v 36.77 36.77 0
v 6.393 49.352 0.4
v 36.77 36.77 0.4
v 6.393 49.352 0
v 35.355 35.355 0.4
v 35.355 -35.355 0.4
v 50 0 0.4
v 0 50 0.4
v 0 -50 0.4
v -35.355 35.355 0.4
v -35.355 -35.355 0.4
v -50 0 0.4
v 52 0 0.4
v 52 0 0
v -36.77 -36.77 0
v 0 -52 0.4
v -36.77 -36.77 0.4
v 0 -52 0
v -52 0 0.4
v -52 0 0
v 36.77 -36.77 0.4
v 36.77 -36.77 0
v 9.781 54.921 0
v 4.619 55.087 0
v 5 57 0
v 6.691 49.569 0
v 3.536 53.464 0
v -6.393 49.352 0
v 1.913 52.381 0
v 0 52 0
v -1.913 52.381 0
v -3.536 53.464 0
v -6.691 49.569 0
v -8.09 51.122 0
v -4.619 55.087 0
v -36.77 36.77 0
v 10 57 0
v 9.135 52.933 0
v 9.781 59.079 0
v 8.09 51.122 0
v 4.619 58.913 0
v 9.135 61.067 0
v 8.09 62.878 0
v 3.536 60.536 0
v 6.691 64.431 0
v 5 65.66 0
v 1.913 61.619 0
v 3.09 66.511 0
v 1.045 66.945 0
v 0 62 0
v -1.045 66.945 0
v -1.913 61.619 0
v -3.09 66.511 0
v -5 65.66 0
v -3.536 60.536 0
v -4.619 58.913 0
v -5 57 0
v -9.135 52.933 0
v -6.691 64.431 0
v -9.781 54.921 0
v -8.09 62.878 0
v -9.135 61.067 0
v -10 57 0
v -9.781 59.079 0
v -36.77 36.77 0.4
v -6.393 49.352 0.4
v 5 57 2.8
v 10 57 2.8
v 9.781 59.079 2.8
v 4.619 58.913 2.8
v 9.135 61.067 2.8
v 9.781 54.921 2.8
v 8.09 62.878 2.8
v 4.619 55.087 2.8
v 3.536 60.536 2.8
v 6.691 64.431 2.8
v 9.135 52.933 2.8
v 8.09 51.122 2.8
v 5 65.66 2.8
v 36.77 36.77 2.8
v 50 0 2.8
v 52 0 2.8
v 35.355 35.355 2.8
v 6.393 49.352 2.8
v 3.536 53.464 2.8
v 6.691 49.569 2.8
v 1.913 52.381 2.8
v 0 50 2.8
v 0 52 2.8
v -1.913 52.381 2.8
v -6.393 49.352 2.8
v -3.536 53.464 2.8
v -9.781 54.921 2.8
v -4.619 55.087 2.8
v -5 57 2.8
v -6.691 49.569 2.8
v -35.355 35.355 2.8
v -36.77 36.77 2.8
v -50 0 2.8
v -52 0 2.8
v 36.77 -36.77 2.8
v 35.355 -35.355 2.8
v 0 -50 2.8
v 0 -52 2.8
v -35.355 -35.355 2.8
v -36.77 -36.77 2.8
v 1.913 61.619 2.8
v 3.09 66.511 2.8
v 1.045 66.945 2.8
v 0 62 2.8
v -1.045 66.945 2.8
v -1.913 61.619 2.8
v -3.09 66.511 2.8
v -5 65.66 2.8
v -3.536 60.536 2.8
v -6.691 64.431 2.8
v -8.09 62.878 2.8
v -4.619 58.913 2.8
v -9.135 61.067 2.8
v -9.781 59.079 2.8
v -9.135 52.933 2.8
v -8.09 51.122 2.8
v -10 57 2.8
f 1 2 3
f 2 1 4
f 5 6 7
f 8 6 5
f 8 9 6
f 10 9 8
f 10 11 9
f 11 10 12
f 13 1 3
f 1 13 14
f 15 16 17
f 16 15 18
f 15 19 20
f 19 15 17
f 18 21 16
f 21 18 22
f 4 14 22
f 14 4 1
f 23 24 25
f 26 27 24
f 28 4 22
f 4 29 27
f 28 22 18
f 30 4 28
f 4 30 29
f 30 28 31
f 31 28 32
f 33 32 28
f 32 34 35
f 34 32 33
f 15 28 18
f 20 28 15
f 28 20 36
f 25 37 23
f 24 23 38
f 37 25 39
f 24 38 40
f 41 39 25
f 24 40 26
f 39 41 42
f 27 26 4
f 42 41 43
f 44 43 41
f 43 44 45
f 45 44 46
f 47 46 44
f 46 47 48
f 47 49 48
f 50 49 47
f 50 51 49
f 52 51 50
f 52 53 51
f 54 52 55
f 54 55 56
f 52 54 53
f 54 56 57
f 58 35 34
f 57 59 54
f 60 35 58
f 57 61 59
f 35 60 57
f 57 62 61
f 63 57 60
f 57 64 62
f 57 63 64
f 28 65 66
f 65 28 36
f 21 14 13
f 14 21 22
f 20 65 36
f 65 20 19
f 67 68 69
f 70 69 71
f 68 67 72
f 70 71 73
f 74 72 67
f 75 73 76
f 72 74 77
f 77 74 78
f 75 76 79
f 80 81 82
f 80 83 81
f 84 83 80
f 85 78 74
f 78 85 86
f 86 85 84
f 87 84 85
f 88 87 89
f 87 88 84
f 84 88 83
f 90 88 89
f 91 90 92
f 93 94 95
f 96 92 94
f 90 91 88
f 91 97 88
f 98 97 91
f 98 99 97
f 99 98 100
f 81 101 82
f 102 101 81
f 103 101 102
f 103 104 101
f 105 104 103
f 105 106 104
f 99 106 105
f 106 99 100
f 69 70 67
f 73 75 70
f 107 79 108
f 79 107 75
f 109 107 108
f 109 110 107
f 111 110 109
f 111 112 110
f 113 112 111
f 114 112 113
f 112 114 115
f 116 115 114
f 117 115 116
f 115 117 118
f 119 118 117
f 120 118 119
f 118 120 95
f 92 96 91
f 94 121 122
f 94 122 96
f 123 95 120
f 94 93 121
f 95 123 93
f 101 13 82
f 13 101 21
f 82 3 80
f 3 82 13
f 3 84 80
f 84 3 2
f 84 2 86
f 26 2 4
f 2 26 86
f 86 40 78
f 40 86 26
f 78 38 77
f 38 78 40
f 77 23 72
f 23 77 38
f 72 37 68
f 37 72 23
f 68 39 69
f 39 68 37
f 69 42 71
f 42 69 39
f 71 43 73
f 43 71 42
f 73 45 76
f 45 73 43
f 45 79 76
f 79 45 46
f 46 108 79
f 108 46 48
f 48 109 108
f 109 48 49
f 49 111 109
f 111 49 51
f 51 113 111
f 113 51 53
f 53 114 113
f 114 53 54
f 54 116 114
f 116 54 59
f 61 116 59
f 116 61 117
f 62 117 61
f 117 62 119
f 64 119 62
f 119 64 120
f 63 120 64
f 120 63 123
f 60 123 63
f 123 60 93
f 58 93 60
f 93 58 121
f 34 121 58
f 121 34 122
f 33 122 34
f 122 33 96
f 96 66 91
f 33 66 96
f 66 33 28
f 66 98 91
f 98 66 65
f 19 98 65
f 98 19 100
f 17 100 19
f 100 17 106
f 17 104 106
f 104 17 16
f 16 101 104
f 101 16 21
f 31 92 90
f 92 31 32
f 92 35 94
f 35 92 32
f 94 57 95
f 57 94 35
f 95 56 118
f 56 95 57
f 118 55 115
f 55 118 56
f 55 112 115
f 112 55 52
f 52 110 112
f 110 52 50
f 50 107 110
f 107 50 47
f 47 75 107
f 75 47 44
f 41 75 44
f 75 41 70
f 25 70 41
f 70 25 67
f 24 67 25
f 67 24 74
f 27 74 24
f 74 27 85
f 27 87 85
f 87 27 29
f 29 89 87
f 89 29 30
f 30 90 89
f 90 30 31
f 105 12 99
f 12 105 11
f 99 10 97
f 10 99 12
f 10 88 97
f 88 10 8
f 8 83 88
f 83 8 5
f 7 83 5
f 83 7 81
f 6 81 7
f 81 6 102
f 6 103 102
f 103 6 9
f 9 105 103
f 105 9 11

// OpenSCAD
// [FL_INDEX: keywords="openscad, 3d_parametric, Customizable_Lithopane_2, csg_solid" | COT="Parametric OpenSCAD design from 3DCodeverse"]
// Title: Customizable Lithopane 2

// preview[view:south, tilt:top]

/* [Image] */

// Load a 100x100 pixel image.(images will be stretched to fit) Simple photos work best. Don't forget to click the Invert Colors checkbox!
image_file = "image-surface.dat"; // [image_surface:100x100]

/* [Adjustments] */

hole_diameter = 10;

// What layer height will you slice this at?  The thinner the better.
layer_height = 0.2;

// The lower the layer height, the more layers you can use.
number_of_layers = 12; // [5:20]

//detail
detail=8; //[8,10,12,24,48,96]

/* [Hidden] */

length = 100;
width = 100;
// base (white) will always be 2 layers thick
min_layer_height = layer_height*2;
hole_radius = hole_diameter/2;
height = layer_height*number_of_layers;

union() {
intersection() {
//union() {
  // take just the part of surface we want
  difference() {
    translate([0, 0, min_layer_height]) scale([1,1,height]) surface(file=image_file, center=true, convexity=5);
    translate([0,0,-(height+min_layer_height)]) linear_extrude(height=height+min_layer_height) circle(r=length/2, center=true,$fn=detail);
  }
//  linear_extrude(height=layer_height*2) circle(r=(length+4)/2, center=true);

  //linear_extrude(height=height+min_layer_height){
//	  difference(){
//		union(){
//	      circle(r=(length+4)/2,center=true);
//		  translate([0, width/2+hole_radius+2, 0])
//		    circle(r=hole_radius+5);
//		}
//	    union(){
//	      circle(r=length/2, center=true);
//		  translate([0, width/2+hole_radius+2, 0])
//	        circle(r=hole_radius);
//	    }
//	  }
//  }
//}
cylinder(r=(length+4)/2,h=40,center=false,$fn=detail);
				}
 linear_extrude(height=layer_height*2) circle(r=(length+4)/2, center=true,$fn=detail);
linear_extrude(height=height+min_layer_height)
			{
difference(){
		union(){
	      circle(r=(length+4)/2,center=true,$fn=detail);
		  translate([0, width/2+hole_radius+2, 0])
		    circle(r=hole_radius+5);
				}
	    union(){
	      circle(r=length/2, center=true,$fn=detail);
		  translate([0, width/2+hole_radius+2, 0])
	        circle(r=hole_radius);
	   			 }
	 		 }
			}
		}
